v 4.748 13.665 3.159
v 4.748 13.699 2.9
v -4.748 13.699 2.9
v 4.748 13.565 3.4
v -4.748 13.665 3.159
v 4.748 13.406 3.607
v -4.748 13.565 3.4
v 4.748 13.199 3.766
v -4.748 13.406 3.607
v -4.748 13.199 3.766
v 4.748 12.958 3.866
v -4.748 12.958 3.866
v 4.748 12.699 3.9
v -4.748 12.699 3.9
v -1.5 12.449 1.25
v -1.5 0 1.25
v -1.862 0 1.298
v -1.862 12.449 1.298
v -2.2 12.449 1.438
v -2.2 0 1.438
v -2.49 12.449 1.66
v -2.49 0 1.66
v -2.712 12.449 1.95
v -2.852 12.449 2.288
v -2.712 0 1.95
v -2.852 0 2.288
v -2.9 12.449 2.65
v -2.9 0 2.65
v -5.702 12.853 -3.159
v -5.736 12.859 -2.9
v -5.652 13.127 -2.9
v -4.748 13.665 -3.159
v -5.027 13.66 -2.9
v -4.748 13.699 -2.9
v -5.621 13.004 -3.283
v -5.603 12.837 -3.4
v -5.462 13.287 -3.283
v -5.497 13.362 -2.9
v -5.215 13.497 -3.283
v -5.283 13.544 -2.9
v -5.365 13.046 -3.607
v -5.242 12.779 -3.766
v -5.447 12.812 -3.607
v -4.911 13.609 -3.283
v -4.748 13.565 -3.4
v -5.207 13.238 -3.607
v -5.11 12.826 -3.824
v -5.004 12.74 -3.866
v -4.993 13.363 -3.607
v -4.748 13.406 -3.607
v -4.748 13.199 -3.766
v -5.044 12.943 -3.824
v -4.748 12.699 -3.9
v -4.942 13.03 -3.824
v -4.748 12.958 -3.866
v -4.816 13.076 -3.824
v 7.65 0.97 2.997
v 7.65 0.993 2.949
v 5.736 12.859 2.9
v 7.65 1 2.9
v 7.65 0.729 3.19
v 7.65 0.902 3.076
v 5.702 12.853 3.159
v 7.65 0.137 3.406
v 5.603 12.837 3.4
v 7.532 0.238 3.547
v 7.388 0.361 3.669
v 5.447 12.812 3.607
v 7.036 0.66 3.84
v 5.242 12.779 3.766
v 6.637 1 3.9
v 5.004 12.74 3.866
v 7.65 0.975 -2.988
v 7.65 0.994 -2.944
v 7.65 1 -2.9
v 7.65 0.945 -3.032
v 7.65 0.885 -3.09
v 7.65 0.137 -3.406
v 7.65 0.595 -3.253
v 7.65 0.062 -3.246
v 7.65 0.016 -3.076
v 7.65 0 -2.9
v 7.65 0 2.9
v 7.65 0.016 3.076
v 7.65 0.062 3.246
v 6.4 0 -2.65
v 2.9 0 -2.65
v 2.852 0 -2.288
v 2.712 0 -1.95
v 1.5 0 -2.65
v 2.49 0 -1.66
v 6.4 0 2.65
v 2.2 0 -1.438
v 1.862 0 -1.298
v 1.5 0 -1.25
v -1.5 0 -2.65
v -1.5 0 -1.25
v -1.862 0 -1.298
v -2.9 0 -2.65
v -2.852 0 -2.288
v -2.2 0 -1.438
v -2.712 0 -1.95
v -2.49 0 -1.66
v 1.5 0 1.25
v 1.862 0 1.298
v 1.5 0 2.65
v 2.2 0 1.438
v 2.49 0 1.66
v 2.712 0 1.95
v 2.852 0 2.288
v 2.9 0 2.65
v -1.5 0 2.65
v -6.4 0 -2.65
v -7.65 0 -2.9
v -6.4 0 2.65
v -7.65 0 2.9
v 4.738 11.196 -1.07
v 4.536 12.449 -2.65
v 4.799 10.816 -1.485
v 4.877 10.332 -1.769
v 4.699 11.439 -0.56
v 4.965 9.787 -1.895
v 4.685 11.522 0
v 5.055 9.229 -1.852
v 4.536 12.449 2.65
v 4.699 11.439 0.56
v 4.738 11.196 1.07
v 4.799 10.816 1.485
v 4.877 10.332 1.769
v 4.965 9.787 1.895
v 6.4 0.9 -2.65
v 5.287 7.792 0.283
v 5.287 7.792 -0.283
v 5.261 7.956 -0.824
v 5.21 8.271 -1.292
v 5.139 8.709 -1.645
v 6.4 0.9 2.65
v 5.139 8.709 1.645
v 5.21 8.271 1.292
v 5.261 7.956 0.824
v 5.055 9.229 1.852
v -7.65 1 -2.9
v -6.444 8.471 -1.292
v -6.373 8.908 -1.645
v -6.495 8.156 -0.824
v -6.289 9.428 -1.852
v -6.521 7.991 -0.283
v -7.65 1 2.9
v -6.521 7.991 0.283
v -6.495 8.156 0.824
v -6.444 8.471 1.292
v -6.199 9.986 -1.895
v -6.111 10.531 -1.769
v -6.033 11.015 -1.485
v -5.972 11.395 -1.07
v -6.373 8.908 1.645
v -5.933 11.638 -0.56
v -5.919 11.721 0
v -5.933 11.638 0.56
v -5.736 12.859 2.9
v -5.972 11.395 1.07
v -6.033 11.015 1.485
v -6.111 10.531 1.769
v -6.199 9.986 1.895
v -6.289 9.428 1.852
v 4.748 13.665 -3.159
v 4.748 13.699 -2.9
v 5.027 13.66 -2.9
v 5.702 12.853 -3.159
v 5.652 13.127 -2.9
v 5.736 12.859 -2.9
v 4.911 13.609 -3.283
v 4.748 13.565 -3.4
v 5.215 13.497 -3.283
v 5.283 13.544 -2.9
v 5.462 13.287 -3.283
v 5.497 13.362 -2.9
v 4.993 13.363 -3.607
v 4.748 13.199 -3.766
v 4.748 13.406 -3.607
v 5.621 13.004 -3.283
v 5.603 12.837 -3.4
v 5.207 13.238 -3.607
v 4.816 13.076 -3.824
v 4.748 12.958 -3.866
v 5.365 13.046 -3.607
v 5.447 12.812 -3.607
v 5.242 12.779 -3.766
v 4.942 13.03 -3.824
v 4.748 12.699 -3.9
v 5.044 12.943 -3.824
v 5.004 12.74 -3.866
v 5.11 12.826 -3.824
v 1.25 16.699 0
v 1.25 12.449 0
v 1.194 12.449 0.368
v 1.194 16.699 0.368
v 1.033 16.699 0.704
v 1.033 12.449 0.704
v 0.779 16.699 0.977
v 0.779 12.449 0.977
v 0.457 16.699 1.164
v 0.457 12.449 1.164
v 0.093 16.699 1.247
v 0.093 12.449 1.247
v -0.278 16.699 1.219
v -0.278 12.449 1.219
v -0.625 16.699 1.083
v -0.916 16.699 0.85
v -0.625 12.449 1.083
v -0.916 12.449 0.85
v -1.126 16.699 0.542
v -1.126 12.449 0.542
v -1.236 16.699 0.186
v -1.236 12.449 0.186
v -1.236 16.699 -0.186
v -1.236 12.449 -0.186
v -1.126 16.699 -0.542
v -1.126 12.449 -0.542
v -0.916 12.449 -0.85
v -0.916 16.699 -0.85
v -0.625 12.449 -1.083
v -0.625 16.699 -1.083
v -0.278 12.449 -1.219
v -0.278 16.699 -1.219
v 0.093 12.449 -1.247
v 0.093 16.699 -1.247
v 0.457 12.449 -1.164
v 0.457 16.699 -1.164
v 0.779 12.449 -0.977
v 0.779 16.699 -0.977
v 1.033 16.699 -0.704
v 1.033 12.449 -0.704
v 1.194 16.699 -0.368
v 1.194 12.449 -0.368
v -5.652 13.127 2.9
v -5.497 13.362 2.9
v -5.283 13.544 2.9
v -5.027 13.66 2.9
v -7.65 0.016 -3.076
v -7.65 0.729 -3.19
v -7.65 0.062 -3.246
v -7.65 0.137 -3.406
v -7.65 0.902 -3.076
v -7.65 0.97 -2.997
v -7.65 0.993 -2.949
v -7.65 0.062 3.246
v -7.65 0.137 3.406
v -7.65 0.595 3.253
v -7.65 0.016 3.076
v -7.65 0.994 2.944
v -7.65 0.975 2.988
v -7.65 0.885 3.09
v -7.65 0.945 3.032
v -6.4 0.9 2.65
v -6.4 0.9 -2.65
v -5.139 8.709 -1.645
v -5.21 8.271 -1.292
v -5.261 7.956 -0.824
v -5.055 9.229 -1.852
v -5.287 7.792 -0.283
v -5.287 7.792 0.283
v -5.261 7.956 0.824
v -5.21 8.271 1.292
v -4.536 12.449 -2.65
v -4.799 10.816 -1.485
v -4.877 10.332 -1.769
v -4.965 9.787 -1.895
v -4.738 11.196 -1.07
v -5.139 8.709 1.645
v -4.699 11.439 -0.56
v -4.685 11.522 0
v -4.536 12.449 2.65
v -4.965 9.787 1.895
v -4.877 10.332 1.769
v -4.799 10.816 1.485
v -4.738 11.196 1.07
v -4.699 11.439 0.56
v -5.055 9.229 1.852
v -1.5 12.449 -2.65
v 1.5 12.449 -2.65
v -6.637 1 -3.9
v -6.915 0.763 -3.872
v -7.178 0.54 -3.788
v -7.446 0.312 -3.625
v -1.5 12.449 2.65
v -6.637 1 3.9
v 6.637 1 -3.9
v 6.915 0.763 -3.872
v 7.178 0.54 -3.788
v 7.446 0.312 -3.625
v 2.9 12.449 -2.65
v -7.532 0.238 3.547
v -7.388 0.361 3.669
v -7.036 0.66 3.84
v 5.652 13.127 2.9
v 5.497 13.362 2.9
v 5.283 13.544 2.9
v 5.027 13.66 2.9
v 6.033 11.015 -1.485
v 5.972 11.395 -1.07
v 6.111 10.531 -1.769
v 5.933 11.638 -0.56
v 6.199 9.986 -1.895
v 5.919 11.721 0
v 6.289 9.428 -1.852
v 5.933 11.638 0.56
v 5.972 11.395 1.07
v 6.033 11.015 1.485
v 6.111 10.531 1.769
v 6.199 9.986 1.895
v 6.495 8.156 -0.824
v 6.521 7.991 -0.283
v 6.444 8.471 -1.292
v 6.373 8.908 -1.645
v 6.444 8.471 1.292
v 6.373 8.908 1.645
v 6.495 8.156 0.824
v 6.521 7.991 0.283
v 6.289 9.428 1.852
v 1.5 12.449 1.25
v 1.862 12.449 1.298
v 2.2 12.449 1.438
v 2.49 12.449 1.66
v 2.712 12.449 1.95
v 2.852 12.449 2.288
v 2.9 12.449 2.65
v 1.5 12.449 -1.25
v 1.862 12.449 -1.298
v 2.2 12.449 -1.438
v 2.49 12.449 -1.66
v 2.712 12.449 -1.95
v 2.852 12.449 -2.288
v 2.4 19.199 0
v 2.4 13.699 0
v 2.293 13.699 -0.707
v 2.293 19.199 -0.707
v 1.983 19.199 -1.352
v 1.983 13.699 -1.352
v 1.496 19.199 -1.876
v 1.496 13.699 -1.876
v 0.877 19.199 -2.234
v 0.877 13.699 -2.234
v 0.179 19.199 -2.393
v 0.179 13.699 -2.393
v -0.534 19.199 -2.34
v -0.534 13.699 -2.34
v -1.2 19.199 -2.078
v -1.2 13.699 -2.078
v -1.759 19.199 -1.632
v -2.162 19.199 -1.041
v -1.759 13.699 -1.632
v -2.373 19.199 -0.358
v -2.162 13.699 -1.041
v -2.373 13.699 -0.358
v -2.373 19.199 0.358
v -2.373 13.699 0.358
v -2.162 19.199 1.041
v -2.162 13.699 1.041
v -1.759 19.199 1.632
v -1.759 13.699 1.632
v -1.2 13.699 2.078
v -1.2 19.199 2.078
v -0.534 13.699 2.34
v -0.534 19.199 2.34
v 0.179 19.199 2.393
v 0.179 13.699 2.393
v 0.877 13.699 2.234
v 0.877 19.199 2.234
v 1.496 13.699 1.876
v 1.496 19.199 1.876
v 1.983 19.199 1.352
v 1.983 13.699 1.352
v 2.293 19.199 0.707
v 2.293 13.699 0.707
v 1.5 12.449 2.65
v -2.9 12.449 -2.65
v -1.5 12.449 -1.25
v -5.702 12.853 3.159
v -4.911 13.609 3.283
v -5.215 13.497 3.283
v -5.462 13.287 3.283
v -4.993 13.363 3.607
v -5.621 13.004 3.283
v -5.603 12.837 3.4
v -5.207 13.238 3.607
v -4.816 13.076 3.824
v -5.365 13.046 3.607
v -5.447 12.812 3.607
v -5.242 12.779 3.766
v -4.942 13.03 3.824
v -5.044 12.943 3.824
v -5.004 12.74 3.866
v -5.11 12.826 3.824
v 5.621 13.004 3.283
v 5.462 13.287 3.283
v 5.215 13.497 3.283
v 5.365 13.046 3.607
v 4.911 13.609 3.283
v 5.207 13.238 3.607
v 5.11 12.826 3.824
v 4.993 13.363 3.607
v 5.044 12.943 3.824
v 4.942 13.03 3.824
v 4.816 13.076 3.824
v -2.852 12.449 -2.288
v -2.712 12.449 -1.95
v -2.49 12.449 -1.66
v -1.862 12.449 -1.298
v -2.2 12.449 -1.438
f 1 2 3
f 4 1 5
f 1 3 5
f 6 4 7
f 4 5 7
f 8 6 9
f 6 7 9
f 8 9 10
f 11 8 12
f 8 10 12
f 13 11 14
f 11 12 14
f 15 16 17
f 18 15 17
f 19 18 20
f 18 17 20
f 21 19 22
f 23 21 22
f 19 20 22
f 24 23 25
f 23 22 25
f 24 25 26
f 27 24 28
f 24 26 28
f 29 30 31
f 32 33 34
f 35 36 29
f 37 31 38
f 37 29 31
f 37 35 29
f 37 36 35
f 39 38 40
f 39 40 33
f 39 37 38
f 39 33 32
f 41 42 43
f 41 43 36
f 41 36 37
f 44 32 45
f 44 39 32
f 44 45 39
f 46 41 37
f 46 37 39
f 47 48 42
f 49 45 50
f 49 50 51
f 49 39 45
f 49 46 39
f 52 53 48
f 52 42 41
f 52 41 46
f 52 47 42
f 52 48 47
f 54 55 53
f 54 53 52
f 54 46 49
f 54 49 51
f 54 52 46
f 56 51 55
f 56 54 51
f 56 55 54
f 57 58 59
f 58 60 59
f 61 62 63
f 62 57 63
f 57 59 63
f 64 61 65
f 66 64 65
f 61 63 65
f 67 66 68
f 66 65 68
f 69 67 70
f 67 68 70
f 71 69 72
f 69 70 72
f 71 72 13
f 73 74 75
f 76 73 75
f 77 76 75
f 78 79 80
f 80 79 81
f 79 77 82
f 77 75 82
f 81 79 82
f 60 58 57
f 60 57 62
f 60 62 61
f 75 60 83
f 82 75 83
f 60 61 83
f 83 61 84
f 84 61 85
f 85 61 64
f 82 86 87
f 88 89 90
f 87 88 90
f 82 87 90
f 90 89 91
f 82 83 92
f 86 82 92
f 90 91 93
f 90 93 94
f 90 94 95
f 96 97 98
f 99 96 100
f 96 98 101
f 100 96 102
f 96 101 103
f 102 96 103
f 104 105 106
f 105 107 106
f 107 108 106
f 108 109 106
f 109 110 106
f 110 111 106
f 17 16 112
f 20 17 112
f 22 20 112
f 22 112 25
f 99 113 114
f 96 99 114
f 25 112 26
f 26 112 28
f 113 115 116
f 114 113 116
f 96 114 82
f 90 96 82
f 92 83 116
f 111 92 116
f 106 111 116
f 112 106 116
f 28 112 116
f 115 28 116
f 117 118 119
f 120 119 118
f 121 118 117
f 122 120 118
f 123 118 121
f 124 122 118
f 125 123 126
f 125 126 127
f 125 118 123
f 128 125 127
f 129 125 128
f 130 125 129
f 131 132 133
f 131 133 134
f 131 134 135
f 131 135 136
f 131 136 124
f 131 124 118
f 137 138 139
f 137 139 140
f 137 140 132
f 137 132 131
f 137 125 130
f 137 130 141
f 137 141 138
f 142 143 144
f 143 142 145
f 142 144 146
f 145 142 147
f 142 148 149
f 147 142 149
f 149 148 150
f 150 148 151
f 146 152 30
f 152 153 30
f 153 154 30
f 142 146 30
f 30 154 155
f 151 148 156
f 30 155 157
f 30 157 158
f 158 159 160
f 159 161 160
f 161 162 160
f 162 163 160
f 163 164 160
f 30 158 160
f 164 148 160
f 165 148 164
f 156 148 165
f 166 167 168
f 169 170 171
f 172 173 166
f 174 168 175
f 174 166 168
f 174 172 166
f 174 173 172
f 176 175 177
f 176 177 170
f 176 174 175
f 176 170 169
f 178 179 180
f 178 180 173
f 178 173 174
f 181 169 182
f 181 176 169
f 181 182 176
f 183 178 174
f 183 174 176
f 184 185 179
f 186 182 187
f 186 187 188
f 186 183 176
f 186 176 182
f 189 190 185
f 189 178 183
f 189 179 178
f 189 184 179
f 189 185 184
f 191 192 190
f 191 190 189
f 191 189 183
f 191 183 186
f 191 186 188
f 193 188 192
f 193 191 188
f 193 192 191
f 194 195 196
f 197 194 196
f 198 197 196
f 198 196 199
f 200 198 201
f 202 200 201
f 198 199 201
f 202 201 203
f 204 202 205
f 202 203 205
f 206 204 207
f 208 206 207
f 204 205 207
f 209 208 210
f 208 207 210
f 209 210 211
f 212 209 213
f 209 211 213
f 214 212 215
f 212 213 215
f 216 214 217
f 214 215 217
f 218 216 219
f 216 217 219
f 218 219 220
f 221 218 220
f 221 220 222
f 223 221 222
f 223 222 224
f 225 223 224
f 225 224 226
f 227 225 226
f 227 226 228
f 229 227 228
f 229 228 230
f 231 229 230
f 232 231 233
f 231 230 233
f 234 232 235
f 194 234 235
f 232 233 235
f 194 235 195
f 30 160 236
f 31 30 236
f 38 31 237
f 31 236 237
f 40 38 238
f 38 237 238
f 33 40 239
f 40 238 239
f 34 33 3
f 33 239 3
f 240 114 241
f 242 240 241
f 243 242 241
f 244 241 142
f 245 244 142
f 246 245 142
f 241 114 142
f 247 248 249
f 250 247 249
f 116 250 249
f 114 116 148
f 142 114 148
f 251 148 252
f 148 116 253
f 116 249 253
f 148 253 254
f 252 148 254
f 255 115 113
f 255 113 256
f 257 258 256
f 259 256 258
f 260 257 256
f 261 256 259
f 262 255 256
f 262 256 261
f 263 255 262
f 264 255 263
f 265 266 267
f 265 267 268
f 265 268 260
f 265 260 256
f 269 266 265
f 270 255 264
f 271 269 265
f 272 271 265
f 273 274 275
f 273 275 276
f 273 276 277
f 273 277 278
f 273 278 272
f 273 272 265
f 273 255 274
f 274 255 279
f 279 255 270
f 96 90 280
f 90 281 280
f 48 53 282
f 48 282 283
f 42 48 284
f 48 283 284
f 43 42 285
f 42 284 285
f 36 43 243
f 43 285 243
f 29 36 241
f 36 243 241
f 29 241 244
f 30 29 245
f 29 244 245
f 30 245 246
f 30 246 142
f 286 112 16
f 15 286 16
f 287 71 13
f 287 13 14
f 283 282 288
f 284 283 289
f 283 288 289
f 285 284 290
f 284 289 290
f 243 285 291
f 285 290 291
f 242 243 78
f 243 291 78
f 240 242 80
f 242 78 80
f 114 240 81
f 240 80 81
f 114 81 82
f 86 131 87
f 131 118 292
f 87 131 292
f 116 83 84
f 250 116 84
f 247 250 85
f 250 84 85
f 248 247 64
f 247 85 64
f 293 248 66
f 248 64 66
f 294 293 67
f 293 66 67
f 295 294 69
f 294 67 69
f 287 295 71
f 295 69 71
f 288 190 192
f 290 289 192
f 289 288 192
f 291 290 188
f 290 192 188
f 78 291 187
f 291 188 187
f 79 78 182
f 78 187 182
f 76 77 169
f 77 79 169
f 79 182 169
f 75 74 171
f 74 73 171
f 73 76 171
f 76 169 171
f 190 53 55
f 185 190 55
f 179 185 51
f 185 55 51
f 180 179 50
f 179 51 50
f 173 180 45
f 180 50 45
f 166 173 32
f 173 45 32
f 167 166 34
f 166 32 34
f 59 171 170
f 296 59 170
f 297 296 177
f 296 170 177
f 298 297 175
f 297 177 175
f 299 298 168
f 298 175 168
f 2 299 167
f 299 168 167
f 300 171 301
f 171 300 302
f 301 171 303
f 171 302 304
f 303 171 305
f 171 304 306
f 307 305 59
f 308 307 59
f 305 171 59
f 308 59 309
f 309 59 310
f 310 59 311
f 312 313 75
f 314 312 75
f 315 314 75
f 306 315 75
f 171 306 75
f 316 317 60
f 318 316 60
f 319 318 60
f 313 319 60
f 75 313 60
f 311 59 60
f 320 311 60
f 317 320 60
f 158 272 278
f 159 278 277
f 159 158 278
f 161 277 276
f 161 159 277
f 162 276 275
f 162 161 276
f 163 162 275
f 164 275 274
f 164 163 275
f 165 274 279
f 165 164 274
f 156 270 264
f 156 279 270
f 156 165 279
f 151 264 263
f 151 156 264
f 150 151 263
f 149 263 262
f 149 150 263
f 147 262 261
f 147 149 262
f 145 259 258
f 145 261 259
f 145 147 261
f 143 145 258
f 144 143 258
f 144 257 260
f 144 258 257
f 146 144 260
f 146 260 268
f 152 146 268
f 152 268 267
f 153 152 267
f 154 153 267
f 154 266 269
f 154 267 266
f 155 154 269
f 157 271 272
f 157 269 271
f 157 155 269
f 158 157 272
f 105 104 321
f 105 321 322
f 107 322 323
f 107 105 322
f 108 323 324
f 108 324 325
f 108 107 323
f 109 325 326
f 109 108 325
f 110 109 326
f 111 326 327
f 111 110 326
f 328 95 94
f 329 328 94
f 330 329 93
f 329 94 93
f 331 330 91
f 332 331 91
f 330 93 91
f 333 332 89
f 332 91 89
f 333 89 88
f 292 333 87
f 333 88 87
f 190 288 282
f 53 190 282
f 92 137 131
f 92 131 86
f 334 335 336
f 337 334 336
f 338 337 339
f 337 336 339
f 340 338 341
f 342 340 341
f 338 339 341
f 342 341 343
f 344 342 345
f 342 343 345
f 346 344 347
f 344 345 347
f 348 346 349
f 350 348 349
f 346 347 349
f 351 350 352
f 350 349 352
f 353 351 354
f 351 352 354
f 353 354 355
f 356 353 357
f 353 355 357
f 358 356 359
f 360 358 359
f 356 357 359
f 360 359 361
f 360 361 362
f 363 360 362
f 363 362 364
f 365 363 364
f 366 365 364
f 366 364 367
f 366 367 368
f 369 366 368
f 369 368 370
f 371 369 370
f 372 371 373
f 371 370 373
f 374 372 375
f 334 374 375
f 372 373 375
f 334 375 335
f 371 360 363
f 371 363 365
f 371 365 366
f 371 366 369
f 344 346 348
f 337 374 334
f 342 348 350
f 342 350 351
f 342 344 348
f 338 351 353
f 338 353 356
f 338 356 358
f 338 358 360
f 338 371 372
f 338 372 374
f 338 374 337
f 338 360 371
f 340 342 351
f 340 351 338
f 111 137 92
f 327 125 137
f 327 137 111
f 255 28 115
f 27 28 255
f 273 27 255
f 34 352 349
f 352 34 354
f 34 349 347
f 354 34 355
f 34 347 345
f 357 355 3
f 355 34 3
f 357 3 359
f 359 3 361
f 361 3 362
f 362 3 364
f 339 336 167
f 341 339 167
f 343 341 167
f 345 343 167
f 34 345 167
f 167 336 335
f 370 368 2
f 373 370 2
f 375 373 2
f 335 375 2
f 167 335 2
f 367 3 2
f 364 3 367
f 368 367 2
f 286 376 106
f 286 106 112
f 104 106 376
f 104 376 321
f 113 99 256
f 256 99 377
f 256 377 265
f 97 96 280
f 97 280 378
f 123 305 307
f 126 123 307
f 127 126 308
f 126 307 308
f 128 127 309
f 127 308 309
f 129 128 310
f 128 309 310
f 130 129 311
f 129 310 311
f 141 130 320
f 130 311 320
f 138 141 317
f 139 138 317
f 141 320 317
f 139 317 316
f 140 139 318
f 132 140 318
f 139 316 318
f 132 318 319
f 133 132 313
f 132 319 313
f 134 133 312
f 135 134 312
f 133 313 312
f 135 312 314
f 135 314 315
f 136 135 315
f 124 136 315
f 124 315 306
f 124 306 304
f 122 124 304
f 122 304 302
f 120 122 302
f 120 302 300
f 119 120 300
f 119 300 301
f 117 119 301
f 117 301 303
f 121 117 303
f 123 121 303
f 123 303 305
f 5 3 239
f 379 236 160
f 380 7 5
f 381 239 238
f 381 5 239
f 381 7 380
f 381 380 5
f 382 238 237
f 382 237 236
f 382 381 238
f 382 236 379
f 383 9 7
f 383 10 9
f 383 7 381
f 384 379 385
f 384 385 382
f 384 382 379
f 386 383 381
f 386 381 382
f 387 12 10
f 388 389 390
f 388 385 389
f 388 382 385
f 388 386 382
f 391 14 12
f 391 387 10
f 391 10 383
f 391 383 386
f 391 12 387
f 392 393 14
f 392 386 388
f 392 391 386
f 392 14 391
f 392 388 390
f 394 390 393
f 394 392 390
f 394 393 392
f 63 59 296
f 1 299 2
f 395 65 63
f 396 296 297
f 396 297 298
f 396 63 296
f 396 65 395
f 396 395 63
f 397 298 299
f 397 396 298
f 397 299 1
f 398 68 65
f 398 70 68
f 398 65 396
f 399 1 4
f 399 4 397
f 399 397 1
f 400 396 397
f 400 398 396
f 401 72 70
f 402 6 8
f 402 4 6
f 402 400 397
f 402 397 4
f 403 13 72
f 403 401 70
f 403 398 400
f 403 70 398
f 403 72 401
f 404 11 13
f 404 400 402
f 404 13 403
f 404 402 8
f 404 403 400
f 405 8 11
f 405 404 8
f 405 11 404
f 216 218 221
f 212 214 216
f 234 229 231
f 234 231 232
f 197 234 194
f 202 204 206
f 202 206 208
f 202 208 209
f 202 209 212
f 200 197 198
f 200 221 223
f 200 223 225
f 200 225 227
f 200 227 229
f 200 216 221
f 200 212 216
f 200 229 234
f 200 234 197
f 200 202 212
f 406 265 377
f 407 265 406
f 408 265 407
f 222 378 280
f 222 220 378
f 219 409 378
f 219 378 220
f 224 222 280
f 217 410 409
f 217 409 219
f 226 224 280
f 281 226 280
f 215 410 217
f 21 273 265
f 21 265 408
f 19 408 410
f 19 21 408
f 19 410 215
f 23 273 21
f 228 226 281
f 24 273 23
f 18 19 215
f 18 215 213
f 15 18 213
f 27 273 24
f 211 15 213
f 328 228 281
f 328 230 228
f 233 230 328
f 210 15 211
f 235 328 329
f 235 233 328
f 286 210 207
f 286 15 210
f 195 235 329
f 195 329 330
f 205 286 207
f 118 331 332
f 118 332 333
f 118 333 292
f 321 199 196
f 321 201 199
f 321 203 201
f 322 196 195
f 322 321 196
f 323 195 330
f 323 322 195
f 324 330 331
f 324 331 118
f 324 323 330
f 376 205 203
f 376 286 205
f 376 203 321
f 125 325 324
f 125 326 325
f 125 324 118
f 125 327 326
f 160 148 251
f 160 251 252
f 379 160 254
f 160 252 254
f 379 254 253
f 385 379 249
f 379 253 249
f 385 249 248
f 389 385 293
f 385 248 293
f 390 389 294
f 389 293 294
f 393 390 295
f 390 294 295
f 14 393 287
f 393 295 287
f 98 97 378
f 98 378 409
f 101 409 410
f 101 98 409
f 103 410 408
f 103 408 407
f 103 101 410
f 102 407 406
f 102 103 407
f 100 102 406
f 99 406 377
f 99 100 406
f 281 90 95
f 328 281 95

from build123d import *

# Parameters (mm, degrees)
BOSS_EXTRUDE1_DEPTH  = 3.9
SHELL2_T             = -1.25
SKETCH5_R            = 1.9
CUT_EXTRUDE2_DEPTH   = 7.8
FILLET1_R            = 1
SKETCH6_R            = 2.4
BOSS_EXTRUDE2_DEPTH  = 5.5
SKETCH7_R            = 1.25
CUT_EXTRUDE3_DEPTH   = 4.25
BOSS_EXTRUDE3_DEPTH  = 12.449209595
MIRROR3_COPY_1_DEPTH = 12.449209595


with BuildPart() as part:
    # Sketch4 → Boss-Extrude1 (new, symmetric)
    with BuildSketch(Plane.XY):
        Polygon((7.65, 0), (-7.65, 0), (-7.65, 1), (-5.6, 13.699209595), (5.6, 13.699209595), (7.65, 1), align=None)
    extrude(amount=BOSS_EXTRUDE1_DEPTH, both=True)

    # Shell2
    shell2_openings = [part.faces().sort_by_distance(p)[0] for p in [
        (0, 0, 0),
    ]]
    offset(amount=SHELL2_T, openings=shell2_openings, kind=Kind.INTERSECTION)

    # Sketch5 → Cut-Extrude2 (cut)
    with BuildSketch(Plane(origin=(7.613040698, 1.228953134, 0), x_dir=(0, 0, -1), z_dir=(0.9872198433487761, 0.15936430245954739, 0))):
        with Locations(Location((0, 8.728225826, 0), (0, 0, 90))):
            Circle(SKETCH5_R)
    cut_extrude2 = extrude(amount=-CUT_EXTRUDE2_DEPTH, mode=Mode.SUBTRACT)

    # Mirror1: Cut-Extrude2 across plane
    add(cut_extrude2.mirror(Plane(origin=(0, 0, 0), x_dir=(0, 0, 1), z_dir=(1, 0, 0))), mode=Mode.SUBTRACT)

    # Fillet1
    # the kernel refuses this fillet: 1 mm, written as the material it takes off along each edge
    with BuildSketch(Plane(origin=(4.748481766, 12.699209595, -2.9), x_dir=(0, 1, 0), z_dir=(0, 0, -1))) as fillet1_piece_1_section:
        Polygon((0, 0), (FILLET1_R, 0), (FILLET1_R, FILLET1_R * 0.851518233962), (FILLET1_R * 0.15936430246, FILLET1_R * 0.987219843349), align=None)
    fillet1_piece_1 = extrude(amount=FILLET1_R, mode=Mode.PRIVATE)
    fillet1_piece_1 = fillet1_piece_1 - Plane(origin=(4.748481766, 12.699209595, -2.9), x_dir=(-0.6483192491128319, -0.7613686040478513, 0), z_dir=(0, 0, -1)) * Sphere(FILLET1_R, mode=Mode.PRIVATE)
    add(fillet1_piece_1, mode=Mode.SUBTRACT)
    with BuildSketch(Plane(origin=(4.748481766, 12.699209595, 2.9), x_dir=(0, 1, 0), z_dir=(0, 0, 1))) as fillet1_piece_2_section:
        Polygon((0, 0), (FILLET1_R, 0), (FILLET1_R, -FILLET1_R * 0.851518233962), (FILLET1_R * 0.15936430246, -FILLET1_R * 0.987219843349), align=None)
    fillet1_piece_2 = extrude(amount=FILLET1_R, mode=Mode.PRIVATE)
    fillet1_piece_2 = fillet1_piece_2 - Plane(origin=(4.748481766, 12.699209595, 2.9), x_dir=(-0.6483192491128319, -0.7613686040478513, 0), z_dir=(0, 0, 1)) * Sphere(FILLET1_R, mode=Mode.PRIVATE)
    add(fillet1_piece_2, mode=Mode.SUBTRACT)
    with BuildSketch(Plane(origin=(-4.748481766, 12.699209595, 2.9), x_dir=(-0.9872198433487762, 0.15936430245954666, 0), z_dir=(0, 0, 1))) as fillet1_piece_3_section:
        Polygon((0, 0), (FILLET1_R, 0), (FILLET1_R, -FILLET1_R * 0.851518233962), (FILLET1_R * 0.15936430246, -FILLET1_R * 0.987219843349), align=None)
    fillet1_piece_3 = extrude(amount=FILLET1_R, mode=Mode.PRIVATE)
    fillet1_piece_3 = fillet1_piece_3 - Plane(origin=(-4.748481766, 12.699209595, 2.9), x_dir=(0.6483192491128325, -0.7613686040478509, 0), z_dir=(0, 0, 1)) * Sphere(FILLET1_R, mode=Mode.PRIVATE)
    add(fillet1_piece_3, mode=Mode.SUBTRACT)
    with BuildSketch(Plane(origin=(-4.748481766, 12.699209595, -2.9), x_dir=(-0.9872198433487762, 0.15936430245954666, 0), z_dir=(0, 0, -1))) as fillet1_piece_4_section:
        Polygon((0, 0), (FILLET1_R, 0), (FILLET1_R, FILLET1_R * 0.851518233962), (FILLET1_R * 0.15936430246, FILLET1_R * 0.987219843349), align=None)
    fillet1_piece_4 = extrude(amount=FILLET1_R, mode=Mode.PRIVATE)
    fillet1_piece_4 = fillet1_piece_4 - Plane(origin=(-4.748481766, 12.699209595, -2.9), x_dir=(0.6483192491128325, -0.7613686040478509, 0), z_dir=(0, 0, -1)) * Sphere(FILLET1_R, mode=Mode.PRIVATE)
    add(fillet1_piece_4, mode=Mode.SUBTRACT)
    with BuildSketch(Plane(origin=(5.6, 13.699209595, -2.9), x_dir=(-1, 0, 0), z_dir=(0, 0, 1))) as fillet1_piece_5:
        with BuildLine():
            CenterArc((FILLET1_R * 0.851518233962, FILLET1_R), FILLET1_R, 189.17, 80.83)
            Line((-FILLET1_R * 0.135701609387, FILLET1_R * 0.84063569754), (0, 0))
            Line((0, 0), (FILLET1_R * 0.851518233962, 0))
        make_face()
    extrude(amount=5.8, mode=Mode.SUBTRACT)
    with BuildSketch(Plane(origin=(-4.748481766, 13.699209595, 3.9), x_dir=(0, -1, 0), z_dir=(1, 0, 0)), Plane(origin=(-4.748481766, 13.699209595, -3.9), x_dir=(0, 0, 1), z_dir=(1, 0, 0))) as fillet1_piece_6:
        with BuildLine():
            CenterArc((FILLET1_R, FILLET1_R), FILLET1_R, 180, 90)
            Line((0, FILLET1_R), (0, 0))
            Line((0, 0), (FILLET1_R, 0))
        make_face()
    extrude(amount=9.496963532, mode=Mode.SUBTRACT)
    with BuildSketch(Plane(origin=(-5.6, 13.699209595, 2.9), x_dir=(-0.15936430245954636, -0.9872198433487762, 0), z_dir=(0, 0, -1))) as fillet1_piece_7:
        with BuildLine():
            CenterArc((FILLET1_R * 0.851518233962, -FILLET1_R), FILLET1_R, 90, 80.83)
            Line((-FILLET1_R * 0.135701609387, -FILLET1_R * 0.84063569754), (0, 0))
            Line((0, 0), (FILLET1_R * 0.851518233962, 0))
        make_face()
    extrude(amount=5.8, mode=Mode.SUBTRACT)
    with BuildSketch(Plane(origin=(5.735701609, 12.858573897, 3.9), x_dir=(-0.9872198433487762, -0.15936430245954736, 0), z_dir=(0.15936430245954736, -0.9872198433487761, 0)), Plane(origin=(5.735701609, 12.858573897, -3.9), x_dir=(0, 0, 1), z_dir=(0.15936430245954736, -0.9872198433487761, 0)), Plane(origin=(-8.048410756, -1.468049608, -3.9), x_dir=(0, 0, 1), z_dir=(0.15936430245954666, 0.9872198433487762, 0)), Plane(origin=(-8.048410756, -1.468049608, 3.9), x_dir=(0.9872198433487762, -0.15936430245954664, 0), z_dir=(0.15936430245954666, 0.9872198433487762, 0))) as fillet1_piece_8:
        with BuildLine():
            CenterArc((FILLET1_R, FILLET1_R), FILLET1_R, 180, 90)
            Line((0, FILLET1_R), (0, 0))
            Line((0, 0), (FILLET1_R, 0))
        make_face()
    extrude(amount=14.512090293, mode=Mode.SUBTRACT)
    with BuildSketch(Plane(origin=(10.15, 0, 3.9), x_dir=(0, 1, 0), z_dir=(-1, 0, 0)), Plane(origin=(10.15, 0, -3.9), x_dir=(0, 0, 1), z_dir=(-1, 0, 0))) as fillet1_piece_9:
        with BuildLine():
            CenterArc((FILLET1_R, FILLET1_R), FILLET1_R, 180, 90)
            Line((0, FILLET1_R), (0, 0))
            Line((0, 0), (FILLET1_R, 0))
        make_face()
    extrude(amount=20.3, mode=Mode.SUBTRACT)

    # Sketch6 → Boss-Extrude2 (add)
    with BuildSketch(Plane(origin=(0, 13.699209595, 0), x_dir=(1, 0, 0), z_dir=(0, 1, 0))):
        Circle(SKETCH6_R)
    extrude(amount=BOSS_EXTRUDE2_DEPTH)

    # Sketch7 → Cut-Extrude3 (cut)
    with BuildSketch(Plane.XZ.offset(-12.449209595)):
        Circle(SKETCH7_R)
    extrude(amount=-CUT_EXTRUDE3_DEPTH, mode=Mode.SUBTRACT)

    # Sketch8 → Boss-Extrude3 (add)
    with BuildSketch(Plane.XZ):
        with BuildLine():
            Line((-1.5, -2.65), (-1.5, -1.25))
            ThreePointArc((-1.5, -1.25), (-2.489949494, -1.660050506), (-2.9, -2.65))
            Line((-2.9, -2.65), (-1.5, -2.65))
        make_face()
    boss_extrude3 = extrude(amount=-BOSS_EXTRUDE3_DEPTH)

    # Mirror2: Boss-Extrude3 across plane
    add(boss_extrude3.mirror(Plane(origin=(0, 0, 0), x_dir=(0, 0, 1), z_dir=(1, 0, 0))))

    # Mirror3: Boss-Extrude3 across plane
    add(boss_extrude3.mirror(Plane.XY))

    # Mirror3 copy 1 sketch → Mirror3 copy 1 (add)
    with BuildSketch(Plane(origin=(0, 0, 0), x_dir=(-1, 0, 0), z_dir=(0, -1, 0))):
        with BuildLine():
            Line((-1.5, -2.65), (-1.5, -1.25))
            ThreePointArc((-1.5, -1.25), (-2.489949494, -1.660050506), (-2.9, -2.65))
            Line((-2.9, -2.65), (-1.5, -2.65))
        make_face()
    extrude(amount=-MIRROR3_COPY_1_DEPTH)


solid = part.part
